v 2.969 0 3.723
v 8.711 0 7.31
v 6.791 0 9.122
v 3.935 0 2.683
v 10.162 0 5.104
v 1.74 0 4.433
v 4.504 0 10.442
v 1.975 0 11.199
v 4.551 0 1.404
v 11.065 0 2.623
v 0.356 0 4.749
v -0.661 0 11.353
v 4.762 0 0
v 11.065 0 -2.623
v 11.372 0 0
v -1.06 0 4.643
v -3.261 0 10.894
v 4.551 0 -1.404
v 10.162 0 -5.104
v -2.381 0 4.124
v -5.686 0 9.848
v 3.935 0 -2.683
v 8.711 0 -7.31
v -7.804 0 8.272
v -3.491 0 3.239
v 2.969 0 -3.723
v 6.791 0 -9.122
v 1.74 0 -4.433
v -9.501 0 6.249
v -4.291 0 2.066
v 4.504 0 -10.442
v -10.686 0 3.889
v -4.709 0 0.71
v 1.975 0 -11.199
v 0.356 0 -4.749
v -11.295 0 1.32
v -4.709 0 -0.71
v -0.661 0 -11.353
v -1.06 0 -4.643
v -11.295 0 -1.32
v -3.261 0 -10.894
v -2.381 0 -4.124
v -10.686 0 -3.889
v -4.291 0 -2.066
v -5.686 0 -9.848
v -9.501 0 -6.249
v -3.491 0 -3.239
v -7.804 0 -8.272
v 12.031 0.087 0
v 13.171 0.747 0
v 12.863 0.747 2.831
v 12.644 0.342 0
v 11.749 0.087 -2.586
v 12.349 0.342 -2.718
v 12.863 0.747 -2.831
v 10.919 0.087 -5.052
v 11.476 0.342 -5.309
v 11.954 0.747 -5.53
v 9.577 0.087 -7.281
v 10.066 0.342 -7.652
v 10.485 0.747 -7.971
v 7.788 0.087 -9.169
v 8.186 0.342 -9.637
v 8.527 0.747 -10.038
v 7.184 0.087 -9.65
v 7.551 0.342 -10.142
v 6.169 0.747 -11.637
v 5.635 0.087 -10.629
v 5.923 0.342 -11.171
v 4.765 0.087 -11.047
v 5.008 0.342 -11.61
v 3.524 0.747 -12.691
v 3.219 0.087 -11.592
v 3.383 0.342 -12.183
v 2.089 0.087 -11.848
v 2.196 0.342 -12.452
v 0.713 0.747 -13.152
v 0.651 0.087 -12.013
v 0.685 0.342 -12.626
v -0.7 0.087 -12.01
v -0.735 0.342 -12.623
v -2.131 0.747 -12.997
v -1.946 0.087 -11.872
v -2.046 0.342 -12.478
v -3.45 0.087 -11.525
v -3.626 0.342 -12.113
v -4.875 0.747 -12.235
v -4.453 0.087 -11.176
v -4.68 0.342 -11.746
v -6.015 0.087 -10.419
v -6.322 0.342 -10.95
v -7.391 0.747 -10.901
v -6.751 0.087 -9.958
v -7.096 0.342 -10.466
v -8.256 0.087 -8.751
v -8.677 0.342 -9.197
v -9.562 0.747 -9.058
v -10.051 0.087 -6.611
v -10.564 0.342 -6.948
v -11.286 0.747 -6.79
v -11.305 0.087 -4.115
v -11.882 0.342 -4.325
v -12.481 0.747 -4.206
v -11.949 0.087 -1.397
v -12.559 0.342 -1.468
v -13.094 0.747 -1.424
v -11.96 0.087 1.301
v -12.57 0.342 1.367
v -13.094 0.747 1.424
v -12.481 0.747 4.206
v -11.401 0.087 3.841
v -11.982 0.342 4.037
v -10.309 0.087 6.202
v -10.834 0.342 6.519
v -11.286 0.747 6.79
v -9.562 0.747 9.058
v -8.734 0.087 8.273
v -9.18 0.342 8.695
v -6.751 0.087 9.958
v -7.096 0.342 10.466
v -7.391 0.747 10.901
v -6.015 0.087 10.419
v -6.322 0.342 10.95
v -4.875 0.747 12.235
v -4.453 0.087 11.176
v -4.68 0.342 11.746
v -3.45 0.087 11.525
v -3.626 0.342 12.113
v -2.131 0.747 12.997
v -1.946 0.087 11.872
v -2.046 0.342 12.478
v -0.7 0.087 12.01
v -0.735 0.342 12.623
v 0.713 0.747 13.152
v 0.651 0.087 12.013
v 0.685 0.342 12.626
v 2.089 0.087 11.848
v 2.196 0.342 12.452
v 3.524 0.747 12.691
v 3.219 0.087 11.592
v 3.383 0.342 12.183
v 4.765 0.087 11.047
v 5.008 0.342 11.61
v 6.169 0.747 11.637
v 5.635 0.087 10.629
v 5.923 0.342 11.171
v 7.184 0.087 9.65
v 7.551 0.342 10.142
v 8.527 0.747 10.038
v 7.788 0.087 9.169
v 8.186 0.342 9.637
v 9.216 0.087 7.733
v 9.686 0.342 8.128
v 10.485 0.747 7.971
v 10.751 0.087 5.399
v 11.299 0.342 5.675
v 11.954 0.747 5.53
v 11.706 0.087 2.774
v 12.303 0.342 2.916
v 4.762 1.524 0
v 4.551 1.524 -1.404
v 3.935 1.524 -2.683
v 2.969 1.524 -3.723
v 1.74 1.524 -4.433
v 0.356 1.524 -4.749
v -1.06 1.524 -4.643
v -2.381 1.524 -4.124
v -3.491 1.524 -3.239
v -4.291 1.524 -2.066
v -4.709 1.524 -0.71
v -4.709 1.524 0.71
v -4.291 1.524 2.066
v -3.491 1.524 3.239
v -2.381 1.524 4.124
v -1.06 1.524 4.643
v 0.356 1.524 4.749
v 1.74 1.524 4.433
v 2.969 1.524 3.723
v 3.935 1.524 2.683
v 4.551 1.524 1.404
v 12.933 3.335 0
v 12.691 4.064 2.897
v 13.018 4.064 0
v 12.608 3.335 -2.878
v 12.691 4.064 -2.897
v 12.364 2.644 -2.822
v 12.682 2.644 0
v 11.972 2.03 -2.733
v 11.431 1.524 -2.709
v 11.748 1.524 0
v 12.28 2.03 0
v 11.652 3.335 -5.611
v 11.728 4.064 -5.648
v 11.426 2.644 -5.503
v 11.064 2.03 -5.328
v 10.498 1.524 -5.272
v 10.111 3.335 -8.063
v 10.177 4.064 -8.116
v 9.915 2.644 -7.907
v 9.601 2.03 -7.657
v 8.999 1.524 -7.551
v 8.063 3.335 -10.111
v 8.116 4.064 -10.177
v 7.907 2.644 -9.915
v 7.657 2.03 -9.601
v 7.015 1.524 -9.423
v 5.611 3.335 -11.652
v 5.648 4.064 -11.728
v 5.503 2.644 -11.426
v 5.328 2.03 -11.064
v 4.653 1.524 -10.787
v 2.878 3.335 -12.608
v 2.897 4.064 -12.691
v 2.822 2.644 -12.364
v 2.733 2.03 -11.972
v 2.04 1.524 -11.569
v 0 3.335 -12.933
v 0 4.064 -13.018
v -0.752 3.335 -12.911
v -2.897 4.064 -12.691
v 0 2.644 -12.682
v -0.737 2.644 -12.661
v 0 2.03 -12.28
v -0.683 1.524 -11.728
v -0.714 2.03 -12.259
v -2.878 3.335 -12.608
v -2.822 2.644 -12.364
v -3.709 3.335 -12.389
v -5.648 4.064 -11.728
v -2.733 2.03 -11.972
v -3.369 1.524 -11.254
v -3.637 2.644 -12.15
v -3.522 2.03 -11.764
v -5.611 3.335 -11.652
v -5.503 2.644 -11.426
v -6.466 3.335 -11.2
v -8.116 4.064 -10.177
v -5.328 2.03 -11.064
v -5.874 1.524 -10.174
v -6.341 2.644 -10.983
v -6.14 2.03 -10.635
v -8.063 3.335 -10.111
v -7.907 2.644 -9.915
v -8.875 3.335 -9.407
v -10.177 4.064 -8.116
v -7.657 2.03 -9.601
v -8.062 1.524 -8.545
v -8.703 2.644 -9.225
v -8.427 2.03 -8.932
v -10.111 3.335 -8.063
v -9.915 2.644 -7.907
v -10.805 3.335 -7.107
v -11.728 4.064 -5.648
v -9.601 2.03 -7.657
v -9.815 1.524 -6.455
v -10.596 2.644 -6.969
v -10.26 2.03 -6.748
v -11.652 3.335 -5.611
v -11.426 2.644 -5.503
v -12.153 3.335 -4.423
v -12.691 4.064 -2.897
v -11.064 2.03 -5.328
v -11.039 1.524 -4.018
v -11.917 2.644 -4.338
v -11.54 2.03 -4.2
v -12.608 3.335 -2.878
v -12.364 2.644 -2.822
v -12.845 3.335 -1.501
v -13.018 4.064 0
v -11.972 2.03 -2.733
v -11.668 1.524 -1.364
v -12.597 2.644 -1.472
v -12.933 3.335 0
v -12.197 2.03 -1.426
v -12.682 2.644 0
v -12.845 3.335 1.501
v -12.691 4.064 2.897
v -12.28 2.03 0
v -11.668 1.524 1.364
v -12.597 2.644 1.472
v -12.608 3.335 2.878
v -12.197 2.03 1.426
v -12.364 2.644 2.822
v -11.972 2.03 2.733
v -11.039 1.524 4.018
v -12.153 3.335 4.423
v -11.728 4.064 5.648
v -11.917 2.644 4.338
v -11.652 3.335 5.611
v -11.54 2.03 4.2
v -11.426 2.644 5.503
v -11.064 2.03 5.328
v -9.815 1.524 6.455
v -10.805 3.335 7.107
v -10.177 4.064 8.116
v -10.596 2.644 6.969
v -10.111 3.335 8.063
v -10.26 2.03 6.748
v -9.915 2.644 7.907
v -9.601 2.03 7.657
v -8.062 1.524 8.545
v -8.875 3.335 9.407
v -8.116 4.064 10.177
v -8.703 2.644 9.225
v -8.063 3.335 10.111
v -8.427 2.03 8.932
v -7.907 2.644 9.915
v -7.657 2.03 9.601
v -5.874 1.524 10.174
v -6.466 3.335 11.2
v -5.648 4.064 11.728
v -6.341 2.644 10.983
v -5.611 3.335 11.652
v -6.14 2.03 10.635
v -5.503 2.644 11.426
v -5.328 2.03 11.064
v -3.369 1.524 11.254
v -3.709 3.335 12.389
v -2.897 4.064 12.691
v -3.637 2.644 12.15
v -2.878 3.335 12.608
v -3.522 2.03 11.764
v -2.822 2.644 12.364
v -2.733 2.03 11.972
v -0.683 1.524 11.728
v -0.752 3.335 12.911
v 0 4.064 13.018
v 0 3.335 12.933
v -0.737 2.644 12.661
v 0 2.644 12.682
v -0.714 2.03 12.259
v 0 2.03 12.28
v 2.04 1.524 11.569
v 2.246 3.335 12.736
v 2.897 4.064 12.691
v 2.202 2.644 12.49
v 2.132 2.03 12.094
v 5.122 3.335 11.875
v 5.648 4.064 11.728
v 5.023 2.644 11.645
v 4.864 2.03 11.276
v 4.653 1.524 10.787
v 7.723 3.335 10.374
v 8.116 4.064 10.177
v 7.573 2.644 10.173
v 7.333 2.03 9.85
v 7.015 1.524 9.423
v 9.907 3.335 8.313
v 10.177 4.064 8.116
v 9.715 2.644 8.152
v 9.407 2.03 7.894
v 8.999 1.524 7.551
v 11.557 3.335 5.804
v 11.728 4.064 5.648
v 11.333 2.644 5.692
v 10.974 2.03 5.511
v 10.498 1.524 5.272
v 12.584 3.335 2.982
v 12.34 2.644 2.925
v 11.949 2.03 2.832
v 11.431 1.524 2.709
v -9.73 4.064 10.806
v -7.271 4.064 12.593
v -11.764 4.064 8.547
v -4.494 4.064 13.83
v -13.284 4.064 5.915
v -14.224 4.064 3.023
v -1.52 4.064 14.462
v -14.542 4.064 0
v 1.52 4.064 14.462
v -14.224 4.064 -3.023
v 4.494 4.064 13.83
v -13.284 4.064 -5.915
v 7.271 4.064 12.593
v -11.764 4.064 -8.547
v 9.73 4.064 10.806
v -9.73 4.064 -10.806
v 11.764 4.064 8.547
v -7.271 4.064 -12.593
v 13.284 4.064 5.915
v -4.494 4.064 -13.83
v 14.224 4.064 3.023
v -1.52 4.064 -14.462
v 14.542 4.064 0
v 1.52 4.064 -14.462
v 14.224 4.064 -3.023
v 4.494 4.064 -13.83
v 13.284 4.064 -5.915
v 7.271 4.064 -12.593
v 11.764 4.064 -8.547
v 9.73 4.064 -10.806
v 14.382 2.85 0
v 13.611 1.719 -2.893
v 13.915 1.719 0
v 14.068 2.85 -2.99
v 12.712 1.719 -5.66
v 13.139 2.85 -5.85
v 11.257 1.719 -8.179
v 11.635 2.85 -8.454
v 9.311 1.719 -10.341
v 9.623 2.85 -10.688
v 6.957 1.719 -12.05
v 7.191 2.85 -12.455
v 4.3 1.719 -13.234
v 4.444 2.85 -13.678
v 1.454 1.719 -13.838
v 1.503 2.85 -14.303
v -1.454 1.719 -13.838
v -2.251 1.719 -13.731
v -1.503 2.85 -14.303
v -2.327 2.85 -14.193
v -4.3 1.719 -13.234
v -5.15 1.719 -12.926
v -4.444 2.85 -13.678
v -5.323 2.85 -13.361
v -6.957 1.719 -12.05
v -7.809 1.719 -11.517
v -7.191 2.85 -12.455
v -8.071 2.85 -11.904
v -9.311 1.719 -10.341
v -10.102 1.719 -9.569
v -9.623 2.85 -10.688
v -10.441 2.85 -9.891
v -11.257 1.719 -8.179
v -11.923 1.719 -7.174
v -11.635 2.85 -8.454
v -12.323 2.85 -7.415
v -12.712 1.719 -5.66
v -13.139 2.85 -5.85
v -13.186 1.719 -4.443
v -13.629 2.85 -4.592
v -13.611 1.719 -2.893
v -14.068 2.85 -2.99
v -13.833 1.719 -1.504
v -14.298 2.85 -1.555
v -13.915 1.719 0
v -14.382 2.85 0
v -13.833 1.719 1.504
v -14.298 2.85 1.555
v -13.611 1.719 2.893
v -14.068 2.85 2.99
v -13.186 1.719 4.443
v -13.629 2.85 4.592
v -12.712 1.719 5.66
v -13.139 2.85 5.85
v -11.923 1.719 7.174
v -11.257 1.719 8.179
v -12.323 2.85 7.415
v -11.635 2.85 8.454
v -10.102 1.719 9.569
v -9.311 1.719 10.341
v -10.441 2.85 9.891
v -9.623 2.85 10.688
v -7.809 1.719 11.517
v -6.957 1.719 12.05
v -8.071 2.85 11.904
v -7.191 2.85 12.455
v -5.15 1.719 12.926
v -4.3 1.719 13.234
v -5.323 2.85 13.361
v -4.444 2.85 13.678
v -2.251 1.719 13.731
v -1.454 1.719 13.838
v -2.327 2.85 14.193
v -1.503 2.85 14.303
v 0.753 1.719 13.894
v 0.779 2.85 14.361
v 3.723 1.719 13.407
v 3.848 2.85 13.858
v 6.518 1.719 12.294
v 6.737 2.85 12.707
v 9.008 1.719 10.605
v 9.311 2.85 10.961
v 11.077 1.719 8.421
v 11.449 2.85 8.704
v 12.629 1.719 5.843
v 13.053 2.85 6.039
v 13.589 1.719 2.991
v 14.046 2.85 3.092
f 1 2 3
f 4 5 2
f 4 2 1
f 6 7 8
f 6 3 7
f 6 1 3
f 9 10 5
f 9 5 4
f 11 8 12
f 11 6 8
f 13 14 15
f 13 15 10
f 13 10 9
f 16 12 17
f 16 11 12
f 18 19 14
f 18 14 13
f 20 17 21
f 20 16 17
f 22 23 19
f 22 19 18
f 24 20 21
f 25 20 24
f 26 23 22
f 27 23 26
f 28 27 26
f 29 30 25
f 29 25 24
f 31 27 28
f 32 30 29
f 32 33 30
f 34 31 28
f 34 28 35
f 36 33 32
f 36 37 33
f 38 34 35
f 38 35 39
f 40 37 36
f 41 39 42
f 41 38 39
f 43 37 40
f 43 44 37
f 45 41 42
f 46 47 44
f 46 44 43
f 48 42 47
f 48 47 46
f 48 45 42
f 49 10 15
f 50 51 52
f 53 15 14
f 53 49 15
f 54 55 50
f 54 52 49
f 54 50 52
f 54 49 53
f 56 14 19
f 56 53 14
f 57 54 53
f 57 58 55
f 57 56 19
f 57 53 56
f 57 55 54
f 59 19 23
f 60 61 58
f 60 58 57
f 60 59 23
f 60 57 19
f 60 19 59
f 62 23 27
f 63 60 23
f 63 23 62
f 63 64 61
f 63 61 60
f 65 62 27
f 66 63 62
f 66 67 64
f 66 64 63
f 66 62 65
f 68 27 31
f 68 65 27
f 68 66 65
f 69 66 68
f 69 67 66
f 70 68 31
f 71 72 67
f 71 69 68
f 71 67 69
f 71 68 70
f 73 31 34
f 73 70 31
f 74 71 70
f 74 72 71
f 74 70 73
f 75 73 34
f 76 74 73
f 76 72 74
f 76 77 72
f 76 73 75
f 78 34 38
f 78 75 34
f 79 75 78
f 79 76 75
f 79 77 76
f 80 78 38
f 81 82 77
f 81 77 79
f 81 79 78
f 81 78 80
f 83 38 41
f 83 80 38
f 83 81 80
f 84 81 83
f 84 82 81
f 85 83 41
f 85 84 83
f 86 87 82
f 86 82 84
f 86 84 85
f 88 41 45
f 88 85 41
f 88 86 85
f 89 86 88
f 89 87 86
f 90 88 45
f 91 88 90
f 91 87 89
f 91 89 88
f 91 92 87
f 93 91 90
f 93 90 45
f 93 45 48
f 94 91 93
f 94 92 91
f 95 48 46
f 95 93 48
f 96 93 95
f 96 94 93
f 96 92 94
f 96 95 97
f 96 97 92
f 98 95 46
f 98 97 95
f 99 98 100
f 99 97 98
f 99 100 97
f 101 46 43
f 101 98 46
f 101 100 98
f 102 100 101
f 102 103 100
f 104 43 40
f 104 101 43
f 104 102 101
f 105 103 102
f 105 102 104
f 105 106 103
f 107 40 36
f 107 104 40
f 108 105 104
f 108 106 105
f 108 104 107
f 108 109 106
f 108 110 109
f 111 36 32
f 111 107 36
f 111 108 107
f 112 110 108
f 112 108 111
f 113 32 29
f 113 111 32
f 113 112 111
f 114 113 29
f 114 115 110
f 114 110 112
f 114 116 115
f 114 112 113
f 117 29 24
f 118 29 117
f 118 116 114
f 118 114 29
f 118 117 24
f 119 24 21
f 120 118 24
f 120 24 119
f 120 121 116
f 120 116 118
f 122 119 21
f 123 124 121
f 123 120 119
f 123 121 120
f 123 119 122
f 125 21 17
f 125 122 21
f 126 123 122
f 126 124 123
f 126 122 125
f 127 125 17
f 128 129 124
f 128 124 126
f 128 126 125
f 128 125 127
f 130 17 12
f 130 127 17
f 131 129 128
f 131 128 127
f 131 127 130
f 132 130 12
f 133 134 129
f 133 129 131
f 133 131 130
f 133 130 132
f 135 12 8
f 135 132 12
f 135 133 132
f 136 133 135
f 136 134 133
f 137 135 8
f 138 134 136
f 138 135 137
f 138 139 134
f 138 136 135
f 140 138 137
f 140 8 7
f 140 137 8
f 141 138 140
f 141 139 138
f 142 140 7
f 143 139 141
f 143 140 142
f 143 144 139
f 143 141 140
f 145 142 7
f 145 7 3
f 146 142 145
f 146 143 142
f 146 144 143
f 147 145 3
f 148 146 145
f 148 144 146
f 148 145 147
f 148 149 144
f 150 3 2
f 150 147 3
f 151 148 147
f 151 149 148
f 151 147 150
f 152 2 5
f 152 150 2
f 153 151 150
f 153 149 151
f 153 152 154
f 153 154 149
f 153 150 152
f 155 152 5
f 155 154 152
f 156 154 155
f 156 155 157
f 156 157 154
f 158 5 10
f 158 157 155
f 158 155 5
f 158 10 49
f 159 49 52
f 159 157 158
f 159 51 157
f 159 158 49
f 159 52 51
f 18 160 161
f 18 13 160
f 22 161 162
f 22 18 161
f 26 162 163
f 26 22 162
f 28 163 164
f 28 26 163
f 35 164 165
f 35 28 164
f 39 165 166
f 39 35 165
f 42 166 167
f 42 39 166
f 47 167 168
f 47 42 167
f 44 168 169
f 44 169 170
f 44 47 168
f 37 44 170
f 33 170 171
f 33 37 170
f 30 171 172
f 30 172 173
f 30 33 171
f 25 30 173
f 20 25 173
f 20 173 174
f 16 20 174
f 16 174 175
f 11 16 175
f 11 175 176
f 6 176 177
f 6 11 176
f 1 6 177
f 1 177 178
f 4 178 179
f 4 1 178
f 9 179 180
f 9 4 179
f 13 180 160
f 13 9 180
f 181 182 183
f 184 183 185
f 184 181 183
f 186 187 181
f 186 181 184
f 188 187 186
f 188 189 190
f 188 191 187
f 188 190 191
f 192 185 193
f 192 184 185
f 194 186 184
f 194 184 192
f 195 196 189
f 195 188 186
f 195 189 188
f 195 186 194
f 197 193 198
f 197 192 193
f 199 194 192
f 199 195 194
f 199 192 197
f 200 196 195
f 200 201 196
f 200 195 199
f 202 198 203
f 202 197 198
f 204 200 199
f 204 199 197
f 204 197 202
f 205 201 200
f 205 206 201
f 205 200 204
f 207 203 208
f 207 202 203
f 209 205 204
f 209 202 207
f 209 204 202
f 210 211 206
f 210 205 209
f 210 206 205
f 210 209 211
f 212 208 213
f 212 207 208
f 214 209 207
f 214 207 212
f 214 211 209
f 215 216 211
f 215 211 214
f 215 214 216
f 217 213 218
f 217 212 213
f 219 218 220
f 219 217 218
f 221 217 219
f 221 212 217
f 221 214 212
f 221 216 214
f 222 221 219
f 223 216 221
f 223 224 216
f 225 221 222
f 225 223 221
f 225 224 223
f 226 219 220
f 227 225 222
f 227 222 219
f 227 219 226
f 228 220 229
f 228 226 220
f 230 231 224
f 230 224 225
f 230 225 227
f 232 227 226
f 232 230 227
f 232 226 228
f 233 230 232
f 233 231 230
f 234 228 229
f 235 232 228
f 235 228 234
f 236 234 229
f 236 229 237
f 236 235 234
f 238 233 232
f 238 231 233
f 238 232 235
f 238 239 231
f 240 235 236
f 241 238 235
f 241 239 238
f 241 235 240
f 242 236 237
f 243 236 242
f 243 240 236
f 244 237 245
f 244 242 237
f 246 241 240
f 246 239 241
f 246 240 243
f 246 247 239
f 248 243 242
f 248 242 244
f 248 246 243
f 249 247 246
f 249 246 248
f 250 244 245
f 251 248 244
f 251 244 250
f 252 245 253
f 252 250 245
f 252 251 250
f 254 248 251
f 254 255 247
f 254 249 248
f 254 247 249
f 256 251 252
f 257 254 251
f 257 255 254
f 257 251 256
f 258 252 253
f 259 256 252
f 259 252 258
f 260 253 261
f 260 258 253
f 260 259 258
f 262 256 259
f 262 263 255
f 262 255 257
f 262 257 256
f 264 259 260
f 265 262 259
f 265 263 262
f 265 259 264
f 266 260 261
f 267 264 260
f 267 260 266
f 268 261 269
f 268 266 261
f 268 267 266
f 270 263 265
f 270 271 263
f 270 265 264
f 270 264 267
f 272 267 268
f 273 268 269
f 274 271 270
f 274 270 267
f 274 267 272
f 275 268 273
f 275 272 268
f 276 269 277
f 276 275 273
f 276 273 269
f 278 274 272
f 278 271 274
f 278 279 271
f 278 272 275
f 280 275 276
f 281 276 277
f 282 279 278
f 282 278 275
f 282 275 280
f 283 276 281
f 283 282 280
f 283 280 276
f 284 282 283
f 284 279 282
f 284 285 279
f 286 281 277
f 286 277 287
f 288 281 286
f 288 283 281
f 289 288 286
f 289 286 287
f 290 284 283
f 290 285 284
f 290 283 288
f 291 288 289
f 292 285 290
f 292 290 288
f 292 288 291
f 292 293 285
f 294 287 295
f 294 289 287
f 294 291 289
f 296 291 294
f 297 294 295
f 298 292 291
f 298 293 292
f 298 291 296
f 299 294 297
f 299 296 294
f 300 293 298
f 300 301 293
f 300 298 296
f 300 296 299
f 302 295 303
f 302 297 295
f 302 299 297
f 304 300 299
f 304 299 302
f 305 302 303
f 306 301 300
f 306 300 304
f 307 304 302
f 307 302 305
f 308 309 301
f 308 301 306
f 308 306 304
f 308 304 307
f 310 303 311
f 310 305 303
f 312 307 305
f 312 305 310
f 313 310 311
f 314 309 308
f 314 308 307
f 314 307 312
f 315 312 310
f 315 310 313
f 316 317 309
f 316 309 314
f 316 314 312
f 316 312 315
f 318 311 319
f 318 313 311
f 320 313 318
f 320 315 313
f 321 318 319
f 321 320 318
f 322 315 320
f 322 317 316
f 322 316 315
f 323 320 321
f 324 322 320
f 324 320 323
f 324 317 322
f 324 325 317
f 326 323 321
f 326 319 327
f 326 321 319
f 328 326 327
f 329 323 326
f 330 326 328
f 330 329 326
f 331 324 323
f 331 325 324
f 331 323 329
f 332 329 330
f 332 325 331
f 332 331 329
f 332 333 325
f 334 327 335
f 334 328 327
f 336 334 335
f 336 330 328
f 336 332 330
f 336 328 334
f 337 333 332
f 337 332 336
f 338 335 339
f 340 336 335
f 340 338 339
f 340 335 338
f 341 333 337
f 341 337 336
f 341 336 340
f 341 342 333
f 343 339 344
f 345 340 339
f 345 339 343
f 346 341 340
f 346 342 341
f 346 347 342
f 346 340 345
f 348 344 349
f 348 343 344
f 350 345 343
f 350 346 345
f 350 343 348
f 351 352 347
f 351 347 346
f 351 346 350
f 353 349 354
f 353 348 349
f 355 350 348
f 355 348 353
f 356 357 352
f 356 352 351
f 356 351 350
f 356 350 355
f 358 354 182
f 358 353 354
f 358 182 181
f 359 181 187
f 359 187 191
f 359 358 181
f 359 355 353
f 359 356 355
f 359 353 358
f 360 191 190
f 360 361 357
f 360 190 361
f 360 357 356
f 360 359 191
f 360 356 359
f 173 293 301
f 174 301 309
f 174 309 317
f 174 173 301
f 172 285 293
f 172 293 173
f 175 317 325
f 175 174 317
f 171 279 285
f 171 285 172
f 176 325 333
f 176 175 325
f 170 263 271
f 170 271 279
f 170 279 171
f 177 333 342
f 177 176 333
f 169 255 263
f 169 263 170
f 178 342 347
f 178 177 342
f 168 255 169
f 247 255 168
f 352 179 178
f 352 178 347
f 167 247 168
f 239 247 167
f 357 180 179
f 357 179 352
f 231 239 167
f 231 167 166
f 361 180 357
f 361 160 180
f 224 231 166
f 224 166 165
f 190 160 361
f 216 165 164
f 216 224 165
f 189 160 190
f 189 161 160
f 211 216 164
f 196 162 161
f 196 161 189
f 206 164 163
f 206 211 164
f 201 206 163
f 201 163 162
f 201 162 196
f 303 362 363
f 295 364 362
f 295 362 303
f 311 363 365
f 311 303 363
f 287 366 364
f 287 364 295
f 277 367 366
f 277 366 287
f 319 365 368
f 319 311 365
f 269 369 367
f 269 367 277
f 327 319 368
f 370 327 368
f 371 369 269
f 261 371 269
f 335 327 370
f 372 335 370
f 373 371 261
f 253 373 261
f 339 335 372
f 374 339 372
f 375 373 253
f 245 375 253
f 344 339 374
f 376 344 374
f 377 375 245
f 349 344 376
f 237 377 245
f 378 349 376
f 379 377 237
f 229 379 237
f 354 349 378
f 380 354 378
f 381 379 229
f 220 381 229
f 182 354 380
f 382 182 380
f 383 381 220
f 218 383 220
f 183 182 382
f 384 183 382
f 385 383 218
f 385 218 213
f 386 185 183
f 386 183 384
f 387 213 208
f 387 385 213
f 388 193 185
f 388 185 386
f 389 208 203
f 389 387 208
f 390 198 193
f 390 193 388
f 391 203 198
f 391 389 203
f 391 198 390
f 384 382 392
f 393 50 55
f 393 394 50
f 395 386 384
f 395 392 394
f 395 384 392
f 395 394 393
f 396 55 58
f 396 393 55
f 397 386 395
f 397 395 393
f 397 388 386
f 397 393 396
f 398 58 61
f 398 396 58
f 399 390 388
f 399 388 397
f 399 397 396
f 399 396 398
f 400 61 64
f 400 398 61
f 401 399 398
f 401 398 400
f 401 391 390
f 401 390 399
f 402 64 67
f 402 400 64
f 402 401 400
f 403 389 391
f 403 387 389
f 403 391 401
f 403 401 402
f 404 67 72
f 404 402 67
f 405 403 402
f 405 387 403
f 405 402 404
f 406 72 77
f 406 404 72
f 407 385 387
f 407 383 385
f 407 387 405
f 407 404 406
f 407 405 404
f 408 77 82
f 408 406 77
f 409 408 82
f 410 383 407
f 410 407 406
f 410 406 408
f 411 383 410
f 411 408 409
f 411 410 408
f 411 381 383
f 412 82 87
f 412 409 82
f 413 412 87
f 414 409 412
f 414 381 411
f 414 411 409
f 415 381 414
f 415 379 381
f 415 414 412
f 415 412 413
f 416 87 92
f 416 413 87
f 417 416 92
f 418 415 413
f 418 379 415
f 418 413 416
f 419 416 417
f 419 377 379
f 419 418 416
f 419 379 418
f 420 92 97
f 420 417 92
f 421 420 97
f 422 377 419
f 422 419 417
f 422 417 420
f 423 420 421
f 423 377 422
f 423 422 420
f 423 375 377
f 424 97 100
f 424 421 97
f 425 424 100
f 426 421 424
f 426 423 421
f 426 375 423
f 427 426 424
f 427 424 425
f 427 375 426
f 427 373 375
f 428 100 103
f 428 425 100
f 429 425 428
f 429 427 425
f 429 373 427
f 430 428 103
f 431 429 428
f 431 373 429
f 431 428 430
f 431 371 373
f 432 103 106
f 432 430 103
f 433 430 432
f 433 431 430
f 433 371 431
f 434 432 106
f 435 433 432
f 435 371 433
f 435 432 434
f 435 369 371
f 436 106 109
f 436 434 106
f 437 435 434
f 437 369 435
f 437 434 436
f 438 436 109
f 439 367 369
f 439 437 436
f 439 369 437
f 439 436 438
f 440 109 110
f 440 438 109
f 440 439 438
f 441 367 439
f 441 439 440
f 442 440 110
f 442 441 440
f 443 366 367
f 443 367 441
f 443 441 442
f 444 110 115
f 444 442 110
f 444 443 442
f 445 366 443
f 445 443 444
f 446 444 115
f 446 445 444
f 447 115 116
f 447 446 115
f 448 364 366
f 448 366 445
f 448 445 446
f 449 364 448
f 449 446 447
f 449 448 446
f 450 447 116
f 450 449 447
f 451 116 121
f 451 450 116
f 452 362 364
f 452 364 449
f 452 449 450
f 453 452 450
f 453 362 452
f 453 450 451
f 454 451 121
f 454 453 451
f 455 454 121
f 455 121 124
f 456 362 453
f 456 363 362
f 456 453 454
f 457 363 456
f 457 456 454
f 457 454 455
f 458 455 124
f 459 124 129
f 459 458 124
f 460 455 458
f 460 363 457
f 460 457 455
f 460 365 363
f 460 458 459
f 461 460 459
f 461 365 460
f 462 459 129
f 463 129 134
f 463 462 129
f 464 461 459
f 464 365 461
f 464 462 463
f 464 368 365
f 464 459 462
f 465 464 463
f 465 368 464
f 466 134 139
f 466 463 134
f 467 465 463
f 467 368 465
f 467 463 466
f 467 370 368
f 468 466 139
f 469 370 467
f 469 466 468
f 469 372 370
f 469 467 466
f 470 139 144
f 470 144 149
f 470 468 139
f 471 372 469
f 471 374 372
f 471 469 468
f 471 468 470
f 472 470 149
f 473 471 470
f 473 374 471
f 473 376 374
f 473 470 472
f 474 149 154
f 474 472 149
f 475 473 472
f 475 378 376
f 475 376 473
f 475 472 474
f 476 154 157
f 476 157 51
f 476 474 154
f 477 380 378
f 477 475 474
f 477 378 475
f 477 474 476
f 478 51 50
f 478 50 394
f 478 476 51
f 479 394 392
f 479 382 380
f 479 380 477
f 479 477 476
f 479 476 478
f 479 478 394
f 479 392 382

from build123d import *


with BuildPart() as part:
    # Sketch2 → Revolve1 (revolve)
    with BuildSketch(Plane.XY):
        with BuildLine():
            Line((4.7625, 0), (11.371782512, 0))
            ThreePointArc((11.371782512, 0), (12.345828047, 0.194187711), (13.170938407, 0.747058824))
            ThreePointArc((13.170938407, 0.747058824), (14.185363864, 2.26952669), (14.5415, 4.064))
            Line((14.5415, 4.064), (13.0175, 4.064))
            ThreePointArc((13.0175, 4.064), (12.682306331, 2.644096834), (11.7475, 1.524))
            Line((11.7475, 1.524), (4.7625, 1.524))
            Line((4.7625, 1.524), (4.7625, 0))
        make_face()
    revolve(axis=Axis((0, 0, 0), (0, 1, 0)))


solid = part.part
